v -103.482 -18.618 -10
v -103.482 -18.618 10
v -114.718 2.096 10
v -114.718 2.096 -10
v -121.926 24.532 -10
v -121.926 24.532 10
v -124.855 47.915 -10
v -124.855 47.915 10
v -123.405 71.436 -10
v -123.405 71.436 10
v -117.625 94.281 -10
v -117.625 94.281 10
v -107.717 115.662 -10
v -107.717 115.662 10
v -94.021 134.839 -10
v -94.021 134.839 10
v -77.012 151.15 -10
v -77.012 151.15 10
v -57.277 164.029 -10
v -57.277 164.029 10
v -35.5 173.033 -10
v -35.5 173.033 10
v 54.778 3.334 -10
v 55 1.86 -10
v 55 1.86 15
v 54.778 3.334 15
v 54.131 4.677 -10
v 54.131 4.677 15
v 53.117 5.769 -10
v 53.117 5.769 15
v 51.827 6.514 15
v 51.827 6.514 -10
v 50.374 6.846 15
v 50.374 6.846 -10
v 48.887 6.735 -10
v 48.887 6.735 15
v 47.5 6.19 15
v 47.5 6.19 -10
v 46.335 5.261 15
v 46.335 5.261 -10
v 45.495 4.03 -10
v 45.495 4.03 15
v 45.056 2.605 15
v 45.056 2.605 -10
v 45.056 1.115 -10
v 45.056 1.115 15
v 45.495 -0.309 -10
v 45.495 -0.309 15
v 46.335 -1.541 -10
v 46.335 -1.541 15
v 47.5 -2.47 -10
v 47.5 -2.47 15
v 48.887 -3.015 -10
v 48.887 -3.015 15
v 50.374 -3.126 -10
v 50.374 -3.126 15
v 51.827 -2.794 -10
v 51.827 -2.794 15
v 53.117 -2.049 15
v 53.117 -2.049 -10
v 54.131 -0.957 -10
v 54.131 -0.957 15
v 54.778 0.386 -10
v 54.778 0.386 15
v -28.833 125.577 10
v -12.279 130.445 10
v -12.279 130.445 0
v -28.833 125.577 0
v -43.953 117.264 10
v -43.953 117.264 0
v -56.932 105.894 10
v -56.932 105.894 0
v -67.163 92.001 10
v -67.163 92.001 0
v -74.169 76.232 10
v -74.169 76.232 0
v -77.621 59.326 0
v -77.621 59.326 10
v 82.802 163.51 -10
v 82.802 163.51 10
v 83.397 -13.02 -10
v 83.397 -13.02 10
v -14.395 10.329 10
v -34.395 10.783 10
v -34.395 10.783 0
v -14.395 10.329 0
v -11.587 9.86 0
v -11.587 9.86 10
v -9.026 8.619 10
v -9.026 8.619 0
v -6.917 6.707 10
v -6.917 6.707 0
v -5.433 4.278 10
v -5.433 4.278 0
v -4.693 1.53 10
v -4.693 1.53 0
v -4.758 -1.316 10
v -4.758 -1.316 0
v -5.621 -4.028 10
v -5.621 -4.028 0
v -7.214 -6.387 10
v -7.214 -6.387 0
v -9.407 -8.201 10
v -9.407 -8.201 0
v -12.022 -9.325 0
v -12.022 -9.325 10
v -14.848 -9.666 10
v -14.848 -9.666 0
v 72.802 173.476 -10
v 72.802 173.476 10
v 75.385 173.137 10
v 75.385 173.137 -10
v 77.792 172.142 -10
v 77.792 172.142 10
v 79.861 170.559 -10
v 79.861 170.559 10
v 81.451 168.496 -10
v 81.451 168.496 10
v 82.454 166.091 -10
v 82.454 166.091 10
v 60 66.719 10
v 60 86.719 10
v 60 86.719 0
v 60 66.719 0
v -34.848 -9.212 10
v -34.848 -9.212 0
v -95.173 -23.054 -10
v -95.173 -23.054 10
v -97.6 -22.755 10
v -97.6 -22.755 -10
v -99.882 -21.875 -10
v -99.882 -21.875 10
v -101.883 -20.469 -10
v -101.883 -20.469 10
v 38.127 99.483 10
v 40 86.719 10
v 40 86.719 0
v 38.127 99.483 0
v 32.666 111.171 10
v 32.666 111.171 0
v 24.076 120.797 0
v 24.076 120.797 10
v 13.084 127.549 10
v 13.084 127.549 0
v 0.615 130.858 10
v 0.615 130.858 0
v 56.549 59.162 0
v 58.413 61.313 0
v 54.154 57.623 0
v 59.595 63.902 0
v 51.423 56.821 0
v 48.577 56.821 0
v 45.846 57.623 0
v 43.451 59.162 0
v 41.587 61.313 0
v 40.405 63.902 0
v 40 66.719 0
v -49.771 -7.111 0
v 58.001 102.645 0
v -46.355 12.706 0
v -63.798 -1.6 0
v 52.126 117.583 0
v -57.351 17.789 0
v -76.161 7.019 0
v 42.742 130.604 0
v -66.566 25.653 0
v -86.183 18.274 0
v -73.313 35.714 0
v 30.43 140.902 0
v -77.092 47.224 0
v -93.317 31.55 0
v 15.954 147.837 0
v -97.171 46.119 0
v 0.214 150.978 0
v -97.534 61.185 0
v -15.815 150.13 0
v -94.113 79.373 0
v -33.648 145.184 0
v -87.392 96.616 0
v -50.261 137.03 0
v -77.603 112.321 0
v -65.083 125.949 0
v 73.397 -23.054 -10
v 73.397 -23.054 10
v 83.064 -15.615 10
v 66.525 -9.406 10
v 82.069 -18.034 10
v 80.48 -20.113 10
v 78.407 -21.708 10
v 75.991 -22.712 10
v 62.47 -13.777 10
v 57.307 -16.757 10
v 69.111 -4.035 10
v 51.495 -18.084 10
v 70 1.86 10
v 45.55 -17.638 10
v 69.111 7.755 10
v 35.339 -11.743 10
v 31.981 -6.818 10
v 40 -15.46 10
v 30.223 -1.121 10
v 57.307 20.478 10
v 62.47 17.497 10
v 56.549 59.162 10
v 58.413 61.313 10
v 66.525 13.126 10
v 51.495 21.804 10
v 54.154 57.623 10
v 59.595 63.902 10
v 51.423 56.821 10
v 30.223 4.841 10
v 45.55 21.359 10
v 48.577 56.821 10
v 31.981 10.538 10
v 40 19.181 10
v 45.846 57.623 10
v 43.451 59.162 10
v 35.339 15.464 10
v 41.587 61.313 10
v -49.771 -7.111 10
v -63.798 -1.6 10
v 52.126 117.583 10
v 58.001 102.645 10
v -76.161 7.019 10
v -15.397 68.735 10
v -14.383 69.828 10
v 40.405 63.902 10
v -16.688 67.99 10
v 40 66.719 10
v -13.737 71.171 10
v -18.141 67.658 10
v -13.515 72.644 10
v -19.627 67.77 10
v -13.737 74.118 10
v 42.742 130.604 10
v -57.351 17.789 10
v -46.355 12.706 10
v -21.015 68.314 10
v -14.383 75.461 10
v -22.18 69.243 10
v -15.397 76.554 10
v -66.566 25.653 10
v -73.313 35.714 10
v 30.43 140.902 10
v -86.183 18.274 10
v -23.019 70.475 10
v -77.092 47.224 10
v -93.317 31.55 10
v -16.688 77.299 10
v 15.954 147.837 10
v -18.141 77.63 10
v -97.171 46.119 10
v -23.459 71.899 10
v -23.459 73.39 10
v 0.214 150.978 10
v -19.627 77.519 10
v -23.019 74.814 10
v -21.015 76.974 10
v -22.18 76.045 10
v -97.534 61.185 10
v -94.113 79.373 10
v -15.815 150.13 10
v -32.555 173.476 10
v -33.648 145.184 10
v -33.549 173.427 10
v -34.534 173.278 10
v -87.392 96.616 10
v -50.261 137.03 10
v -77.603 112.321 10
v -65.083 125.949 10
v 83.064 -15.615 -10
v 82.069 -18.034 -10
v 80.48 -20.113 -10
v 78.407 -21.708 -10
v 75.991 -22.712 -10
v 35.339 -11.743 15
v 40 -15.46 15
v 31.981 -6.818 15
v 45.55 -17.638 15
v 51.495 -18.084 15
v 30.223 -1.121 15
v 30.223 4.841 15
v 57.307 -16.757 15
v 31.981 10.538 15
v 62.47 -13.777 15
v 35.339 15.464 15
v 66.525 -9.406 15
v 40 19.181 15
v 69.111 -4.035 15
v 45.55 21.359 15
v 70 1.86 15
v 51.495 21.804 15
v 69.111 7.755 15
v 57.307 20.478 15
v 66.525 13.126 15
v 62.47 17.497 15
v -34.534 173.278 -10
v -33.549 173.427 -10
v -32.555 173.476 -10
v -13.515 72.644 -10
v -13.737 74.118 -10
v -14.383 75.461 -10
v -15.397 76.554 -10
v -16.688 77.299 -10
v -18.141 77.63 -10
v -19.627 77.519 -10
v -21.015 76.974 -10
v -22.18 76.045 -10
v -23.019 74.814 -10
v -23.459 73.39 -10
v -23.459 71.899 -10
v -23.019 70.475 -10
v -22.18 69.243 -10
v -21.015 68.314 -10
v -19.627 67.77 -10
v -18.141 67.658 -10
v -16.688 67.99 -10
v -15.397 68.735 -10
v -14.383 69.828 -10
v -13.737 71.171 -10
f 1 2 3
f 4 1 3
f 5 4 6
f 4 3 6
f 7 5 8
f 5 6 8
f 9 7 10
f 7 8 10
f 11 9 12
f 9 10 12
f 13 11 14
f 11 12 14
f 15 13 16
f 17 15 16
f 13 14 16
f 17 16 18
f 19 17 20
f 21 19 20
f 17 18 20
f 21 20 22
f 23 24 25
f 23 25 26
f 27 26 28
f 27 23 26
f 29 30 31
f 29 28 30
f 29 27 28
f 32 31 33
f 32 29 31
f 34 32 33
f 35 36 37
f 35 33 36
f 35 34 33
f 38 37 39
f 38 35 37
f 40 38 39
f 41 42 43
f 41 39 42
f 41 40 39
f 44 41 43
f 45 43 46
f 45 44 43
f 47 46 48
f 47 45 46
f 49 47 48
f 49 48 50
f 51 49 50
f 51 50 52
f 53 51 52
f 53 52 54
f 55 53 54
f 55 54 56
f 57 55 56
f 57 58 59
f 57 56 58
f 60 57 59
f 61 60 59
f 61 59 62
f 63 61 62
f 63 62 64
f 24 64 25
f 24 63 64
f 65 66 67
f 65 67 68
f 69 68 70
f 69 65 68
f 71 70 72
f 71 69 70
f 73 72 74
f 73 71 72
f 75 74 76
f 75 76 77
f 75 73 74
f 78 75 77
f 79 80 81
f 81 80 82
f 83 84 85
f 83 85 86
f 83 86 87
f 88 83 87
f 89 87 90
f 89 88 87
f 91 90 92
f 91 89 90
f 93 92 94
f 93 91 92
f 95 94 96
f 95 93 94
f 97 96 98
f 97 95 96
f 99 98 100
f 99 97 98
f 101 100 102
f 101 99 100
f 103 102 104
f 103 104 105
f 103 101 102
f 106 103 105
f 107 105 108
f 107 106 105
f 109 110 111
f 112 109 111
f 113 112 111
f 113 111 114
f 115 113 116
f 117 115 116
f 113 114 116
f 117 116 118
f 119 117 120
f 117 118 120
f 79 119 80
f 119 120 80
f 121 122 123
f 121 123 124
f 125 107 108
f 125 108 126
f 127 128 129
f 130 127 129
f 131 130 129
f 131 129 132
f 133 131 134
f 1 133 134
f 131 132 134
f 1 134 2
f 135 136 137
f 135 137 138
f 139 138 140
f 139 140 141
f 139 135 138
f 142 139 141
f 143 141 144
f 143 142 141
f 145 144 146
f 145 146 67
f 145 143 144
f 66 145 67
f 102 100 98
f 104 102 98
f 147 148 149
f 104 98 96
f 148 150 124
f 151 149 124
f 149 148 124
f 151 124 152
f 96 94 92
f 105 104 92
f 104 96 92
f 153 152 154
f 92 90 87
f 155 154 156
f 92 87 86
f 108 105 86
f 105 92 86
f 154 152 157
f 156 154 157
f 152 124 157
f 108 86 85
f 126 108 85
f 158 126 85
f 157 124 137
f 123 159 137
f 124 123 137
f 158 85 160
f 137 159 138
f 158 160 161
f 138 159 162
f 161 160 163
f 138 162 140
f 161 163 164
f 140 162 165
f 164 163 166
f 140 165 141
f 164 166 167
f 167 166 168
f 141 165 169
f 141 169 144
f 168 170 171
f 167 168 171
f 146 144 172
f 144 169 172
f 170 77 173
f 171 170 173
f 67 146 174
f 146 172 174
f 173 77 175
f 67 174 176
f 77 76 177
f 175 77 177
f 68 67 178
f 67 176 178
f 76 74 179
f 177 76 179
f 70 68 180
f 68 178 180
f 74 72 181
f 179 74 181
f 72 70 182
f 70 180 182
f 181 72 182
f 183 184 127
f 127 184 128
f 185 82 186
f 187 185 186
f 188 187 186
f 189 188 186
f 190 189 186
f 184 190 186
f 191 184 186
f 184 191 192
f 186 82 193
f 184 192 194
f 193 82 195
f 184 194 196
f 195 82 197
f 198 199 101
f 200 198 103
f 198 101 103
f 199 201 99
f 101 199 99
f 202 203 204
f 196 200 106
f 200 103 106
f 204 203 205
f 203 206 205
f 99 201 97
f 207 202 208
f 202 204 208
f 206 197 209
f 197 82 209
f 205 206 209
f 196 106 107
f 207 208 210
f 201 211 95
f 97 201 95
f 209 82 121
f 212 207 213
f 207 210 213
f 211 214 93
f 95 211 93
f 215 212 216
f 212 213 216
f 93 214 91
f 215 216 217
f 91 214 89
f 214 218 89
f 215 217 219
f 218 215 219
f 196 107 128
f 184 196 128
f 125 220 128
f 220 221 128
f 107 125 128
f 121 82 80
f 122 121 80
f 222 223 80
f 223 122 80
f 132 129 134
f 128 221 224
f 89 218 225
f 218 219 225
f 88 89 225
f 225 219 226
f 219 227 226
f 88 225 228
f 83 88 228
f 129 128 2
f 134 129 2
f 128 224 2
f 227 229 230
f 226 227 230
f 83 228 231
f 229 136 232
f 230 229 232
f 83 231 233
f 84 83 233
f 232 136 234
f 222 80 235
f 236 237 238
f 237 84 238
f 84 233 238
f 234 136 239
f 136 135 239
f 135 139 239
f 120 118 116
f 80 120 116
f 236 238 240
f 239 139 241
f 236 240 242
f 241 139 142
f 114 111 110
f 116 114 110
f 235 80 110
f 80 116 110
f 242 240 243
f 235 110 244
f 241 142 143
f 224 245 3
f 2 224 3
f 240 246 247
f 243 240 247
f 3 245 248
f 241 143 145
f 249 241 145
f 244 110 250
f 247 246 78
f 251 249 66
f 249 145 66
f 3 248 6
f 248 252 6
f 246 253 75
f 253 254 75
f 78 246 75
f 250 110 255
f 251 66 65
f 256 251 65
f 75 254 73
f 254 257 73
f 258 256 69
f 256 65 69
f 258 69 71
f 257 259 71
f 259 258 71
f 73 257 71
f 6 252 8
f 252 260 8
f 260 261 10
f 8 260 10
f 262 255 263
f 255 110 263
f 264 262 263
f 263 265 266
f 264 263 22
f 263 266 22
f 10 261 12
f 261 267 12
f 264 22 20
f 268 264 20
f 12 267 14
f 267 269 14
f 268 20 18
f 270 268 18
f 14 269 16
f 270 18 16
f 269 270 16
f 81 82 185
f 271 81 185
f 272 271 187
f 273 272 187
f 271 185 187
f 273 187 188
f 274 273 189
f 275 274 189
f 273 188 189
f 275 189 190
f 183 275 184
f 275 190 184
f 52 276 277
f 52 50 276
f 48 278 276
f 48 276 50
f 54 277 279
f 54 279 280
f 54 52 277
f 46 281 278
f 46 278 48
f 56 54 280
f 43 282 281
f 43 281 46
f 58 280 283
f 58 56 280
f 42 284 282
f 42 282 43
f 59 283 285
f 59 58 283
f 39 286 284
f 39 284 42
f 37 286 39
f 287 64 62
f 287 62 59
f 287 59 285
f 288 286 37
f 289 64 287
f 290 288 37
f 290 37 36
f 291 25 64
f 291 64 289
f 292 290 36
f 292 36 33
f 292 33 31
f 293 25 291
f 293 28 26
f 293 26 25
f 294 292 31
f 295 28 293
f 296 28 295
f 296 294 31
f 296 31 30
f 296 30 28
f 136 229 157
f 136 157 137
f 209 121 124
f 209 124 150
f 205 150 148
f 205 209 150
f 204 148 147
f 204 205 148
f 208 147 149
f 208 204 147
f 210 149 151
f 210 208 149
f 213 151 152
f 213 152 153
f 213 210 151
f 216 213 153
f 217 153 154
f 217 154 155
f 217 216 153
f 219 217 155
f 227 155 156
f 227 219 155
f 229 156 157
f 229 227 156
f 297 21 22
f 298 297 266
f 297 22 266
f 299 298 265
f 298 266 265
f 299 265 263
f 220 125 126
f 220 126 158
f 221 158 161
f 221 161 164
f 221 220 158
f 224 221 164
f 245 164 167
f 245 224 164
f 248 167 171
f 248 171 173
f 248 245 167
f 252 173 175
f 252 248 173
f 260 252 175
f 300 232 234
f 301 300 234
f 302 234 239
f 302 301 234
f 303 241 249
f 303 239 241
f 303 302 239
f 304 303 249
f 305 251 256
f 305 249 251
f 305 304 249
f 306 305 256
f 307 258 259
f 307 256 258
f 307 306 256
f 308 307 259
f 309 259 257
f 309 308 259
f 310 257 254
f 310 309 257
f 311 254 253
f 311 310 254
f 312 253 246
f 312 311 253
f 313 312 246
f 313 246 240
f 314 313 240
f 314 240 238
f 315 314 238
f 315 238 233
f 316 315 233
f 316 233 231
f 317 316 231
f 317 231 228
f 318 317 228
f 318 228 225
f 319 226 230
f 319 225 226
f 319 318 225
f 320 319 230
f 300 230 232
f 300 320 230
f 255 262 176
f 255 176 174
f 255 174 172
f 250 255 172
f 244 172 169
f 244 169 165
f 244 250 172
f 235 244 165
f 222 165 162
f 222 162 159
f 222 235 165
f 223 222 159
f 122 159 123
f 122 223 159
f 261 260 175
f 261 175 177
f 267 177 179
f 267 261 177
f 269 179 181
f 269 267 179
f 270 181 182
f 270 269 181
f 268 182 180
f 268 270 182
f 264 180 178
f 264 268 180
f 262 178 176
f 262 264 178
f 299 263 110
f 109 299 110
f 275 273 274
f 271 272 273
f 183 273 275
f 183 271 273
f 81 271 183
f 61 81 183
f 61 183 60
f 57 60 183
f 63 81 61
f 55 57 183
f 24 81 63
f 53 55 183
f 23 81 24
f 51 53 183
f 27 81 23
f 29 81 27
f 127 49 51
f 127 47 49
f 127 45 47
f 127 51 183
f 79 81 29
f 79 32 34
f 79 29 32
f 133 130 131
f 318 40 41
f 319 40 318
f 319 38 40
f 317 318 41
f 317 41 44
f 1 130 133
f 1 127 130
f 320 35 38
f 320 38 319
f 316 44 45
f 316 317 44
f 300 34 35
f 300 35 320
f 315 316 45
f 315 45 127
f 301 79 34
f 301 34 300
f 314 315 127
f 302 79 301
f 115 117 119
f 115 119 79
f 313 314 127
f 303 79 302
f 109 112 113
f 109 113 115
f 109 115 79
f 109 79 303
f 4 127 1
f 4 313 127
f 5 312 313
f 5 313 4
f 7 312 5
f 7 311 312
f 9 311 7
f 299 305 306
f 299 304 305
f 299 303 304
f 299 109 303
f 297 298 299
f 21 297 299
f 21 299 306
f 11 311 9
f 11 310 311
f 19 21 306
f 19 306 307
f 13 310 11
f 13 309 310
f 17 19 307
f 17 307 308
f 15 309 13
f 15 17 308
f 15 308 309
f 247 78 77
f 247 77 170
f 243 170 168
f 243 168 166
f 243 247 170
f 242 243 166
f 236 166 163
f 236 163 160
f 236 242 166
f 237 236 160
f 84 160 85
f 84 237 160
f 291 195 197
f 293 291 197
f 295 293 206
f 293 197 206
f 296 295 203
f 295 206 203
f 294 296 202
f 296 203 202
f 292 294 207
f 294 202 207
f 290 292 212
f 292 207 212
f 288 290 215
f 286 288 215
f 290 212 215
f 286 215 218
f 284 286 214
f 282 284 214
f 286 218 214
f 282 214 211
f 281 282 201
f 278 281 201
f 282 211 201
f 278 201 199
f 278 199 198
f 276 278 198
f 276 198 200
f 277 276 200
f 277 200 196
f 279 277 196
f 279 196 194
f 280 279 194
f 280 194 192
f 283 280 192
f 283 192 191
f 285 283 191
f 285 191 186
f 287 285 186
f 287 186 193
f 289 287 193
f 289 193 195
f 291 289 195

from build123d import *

# Parameters (mm, degrees)
BOSS_EXTRUDE1_DEPTH     = 10
BOSS_EXTRUDE2_START     = 10
BOSS_EXTRUDE2_DEPTH     = 10
SKETCH1_5_R             = 20
BOSS_EXTRUDE3_DEPTH     = 15
CUT_EXTRUDE1_DEPTH      = 215.297519294
CUT_EXTRUDE1_DEPTH_BACK = 215.297519294
SKETCH1_6_R             = 5


with BuildPart() as part:
    # Sketch1 → Boss-Extrude1 (new body)
    with BuildSketch(Plane.XY):
        with BuildLine():
            Line((-32.55466062, 173.476173045), (72.802083582, 173.476173045))
            ThreePointArc((72.802083582, 173.476173045), (79.861224101, 170.559148064), (82.802026774, 163.50988007))
            Line((82.802026774, 163.50988007), (83.39706002, -13.020047424))
            ThreePointArc((83.39706002, -13.020047424), (80.480091848, -20.112894968), (73.397116829, -23.053754449))
            Line((73.397116829, -23.053754449), (-95.173260832, -23.053754449))
            ThreePointArc((-95.173260832, -23.053754449), (-99.882498656, -21.875493456), (-103.481994233, -18.618370272))
            ThreePointArc((-103.481994233, -18.618370272), (-117.625312011, 94.28140669), (-35.49963159, 173.032696784))
            ThreePointArc((-35.49963159, 173.032696784), (-34.043748026, 173.364682472), (-32.55466062, 173.476173045))
        make_face()
    extrude(amount=-BOSS_EXTRUDE1_DEPTH)

    # Sketch1<3> → Boss-Extrude2 (add)
    with BuildSketch(Plane.XY.offset(BOSS_EXTRUDE2_START)):
        with BuildLine():
            Line((72.802083582, 173.476173045), (-32.55466062, 173.476173045))
            ThreePointArc((-32.55466062, 173.476173045), (-34.043748026, 173.364682472), (-35.49963159, 173.032696784))
            ThreePointArc((-35.49963159, 173.032696784), (-117.625312011, 94.28140669), (-103.481994233, -18.618370272))
            ThreePointArc((-103.481994233, -18.618370272), (-99.882498656, -21.875493456), (-95.173260832, -23.053754449))
            Line((-95.173260832, -23.053754449), (73.397116829, -23.053754449))
            ThreePointArc((73.397116829, -23.053754449), (80.480091848, -20.112894968), (83.39706002, -13.020047424))
            Line((83.39706002, -13.020047424), (82.802026774, 163.50988007))
            ThreePointArc((82.802026774, 163.50988007), (79.861224101, 170.559148064), (72.802083582, 173.476173045))
        make_face()
        with BuildLine():
            ThreePointArc((-14.394574448, 10.329008016), (-4.623864336, 0.104858961), (-14.848013391, -9.665851152))
            Line((-14.848013391, -9.665851152), (-34.848013391, -9.212295627))
            ThreePointArc((-34.848013391, -9.212295627), (-81.502346372, 12.352630755), (-97.534327335, 61.185492868))
            ThreePointArc((-97.534327335, 61.185492868), (-71.659502341, 119.425599438), (-15.814833806, 150.130478169))
            ThreePointArc((-15.814833806, 150.130478169), (36.907828278, 136.13803225), (59.999999943, 86.719217535))
            Line((59.999999943, 86.719217535), (59.999999943, 66.719217535))
            ThreePointArc((59.999999943, 66.719217535), (49.999999943, 56.719217535), (39.999999943, 66.719217535))
            Line((39.999999943, 66.719217535), (39.999999943, 86.719217535))
            ThreePointArc((39.999999943, 86.719217535), (24.076427728, 120.796742868), (-12.279317814, 130.445455266))
            ThreePointArc((-12.279317814, 130.445455266), (-56.931818797, 105.894326865), (-77.620913723, 59.326472063))
            ThreePointArc((-77.620913723, 59.326472063), (-66.565807676, 25.652999614), (-34.394574448, 10.78256354))
            Line((-34.394574448, 10.78256354), (-14.394574448, 10.329008016))
        make_face(mode=Mode.SUBTRACT)
    extrude(amount=-BOSS_EXTRUDE2_DEPTH)

    # Sketch1<5> → Boss-Extrude3 (add)
    with BuildSketch(Plane.XY):
        with Locations((50, 1.860098346)):
            Circle(SKETCH1_5_R)
    extrude(amount=BOSS_EXTRUDE3_DEPTH)

    # Sketch1<6> → Cut-Extrude1 (cut, two sides: drawn at the far end of the back side and taken through both)
    with BuildSketch(Plane.XY.offset(-CUT_EXTRUDE1_DEPTH_BACK)):
        with Locations((-18.514628019, 72.64435198)):
            Circle(SKETCH1_6_R)
        with Locations((50, 1.860098346)):
            Circle(SKETCH1_6_R)
    extrude(amount=CUT_EXTRUDE1_DEPTH + CUT_EXTRUDE1_DEPTH_BACK, mode=Mode.SUBTRACT)


solid = part.part
